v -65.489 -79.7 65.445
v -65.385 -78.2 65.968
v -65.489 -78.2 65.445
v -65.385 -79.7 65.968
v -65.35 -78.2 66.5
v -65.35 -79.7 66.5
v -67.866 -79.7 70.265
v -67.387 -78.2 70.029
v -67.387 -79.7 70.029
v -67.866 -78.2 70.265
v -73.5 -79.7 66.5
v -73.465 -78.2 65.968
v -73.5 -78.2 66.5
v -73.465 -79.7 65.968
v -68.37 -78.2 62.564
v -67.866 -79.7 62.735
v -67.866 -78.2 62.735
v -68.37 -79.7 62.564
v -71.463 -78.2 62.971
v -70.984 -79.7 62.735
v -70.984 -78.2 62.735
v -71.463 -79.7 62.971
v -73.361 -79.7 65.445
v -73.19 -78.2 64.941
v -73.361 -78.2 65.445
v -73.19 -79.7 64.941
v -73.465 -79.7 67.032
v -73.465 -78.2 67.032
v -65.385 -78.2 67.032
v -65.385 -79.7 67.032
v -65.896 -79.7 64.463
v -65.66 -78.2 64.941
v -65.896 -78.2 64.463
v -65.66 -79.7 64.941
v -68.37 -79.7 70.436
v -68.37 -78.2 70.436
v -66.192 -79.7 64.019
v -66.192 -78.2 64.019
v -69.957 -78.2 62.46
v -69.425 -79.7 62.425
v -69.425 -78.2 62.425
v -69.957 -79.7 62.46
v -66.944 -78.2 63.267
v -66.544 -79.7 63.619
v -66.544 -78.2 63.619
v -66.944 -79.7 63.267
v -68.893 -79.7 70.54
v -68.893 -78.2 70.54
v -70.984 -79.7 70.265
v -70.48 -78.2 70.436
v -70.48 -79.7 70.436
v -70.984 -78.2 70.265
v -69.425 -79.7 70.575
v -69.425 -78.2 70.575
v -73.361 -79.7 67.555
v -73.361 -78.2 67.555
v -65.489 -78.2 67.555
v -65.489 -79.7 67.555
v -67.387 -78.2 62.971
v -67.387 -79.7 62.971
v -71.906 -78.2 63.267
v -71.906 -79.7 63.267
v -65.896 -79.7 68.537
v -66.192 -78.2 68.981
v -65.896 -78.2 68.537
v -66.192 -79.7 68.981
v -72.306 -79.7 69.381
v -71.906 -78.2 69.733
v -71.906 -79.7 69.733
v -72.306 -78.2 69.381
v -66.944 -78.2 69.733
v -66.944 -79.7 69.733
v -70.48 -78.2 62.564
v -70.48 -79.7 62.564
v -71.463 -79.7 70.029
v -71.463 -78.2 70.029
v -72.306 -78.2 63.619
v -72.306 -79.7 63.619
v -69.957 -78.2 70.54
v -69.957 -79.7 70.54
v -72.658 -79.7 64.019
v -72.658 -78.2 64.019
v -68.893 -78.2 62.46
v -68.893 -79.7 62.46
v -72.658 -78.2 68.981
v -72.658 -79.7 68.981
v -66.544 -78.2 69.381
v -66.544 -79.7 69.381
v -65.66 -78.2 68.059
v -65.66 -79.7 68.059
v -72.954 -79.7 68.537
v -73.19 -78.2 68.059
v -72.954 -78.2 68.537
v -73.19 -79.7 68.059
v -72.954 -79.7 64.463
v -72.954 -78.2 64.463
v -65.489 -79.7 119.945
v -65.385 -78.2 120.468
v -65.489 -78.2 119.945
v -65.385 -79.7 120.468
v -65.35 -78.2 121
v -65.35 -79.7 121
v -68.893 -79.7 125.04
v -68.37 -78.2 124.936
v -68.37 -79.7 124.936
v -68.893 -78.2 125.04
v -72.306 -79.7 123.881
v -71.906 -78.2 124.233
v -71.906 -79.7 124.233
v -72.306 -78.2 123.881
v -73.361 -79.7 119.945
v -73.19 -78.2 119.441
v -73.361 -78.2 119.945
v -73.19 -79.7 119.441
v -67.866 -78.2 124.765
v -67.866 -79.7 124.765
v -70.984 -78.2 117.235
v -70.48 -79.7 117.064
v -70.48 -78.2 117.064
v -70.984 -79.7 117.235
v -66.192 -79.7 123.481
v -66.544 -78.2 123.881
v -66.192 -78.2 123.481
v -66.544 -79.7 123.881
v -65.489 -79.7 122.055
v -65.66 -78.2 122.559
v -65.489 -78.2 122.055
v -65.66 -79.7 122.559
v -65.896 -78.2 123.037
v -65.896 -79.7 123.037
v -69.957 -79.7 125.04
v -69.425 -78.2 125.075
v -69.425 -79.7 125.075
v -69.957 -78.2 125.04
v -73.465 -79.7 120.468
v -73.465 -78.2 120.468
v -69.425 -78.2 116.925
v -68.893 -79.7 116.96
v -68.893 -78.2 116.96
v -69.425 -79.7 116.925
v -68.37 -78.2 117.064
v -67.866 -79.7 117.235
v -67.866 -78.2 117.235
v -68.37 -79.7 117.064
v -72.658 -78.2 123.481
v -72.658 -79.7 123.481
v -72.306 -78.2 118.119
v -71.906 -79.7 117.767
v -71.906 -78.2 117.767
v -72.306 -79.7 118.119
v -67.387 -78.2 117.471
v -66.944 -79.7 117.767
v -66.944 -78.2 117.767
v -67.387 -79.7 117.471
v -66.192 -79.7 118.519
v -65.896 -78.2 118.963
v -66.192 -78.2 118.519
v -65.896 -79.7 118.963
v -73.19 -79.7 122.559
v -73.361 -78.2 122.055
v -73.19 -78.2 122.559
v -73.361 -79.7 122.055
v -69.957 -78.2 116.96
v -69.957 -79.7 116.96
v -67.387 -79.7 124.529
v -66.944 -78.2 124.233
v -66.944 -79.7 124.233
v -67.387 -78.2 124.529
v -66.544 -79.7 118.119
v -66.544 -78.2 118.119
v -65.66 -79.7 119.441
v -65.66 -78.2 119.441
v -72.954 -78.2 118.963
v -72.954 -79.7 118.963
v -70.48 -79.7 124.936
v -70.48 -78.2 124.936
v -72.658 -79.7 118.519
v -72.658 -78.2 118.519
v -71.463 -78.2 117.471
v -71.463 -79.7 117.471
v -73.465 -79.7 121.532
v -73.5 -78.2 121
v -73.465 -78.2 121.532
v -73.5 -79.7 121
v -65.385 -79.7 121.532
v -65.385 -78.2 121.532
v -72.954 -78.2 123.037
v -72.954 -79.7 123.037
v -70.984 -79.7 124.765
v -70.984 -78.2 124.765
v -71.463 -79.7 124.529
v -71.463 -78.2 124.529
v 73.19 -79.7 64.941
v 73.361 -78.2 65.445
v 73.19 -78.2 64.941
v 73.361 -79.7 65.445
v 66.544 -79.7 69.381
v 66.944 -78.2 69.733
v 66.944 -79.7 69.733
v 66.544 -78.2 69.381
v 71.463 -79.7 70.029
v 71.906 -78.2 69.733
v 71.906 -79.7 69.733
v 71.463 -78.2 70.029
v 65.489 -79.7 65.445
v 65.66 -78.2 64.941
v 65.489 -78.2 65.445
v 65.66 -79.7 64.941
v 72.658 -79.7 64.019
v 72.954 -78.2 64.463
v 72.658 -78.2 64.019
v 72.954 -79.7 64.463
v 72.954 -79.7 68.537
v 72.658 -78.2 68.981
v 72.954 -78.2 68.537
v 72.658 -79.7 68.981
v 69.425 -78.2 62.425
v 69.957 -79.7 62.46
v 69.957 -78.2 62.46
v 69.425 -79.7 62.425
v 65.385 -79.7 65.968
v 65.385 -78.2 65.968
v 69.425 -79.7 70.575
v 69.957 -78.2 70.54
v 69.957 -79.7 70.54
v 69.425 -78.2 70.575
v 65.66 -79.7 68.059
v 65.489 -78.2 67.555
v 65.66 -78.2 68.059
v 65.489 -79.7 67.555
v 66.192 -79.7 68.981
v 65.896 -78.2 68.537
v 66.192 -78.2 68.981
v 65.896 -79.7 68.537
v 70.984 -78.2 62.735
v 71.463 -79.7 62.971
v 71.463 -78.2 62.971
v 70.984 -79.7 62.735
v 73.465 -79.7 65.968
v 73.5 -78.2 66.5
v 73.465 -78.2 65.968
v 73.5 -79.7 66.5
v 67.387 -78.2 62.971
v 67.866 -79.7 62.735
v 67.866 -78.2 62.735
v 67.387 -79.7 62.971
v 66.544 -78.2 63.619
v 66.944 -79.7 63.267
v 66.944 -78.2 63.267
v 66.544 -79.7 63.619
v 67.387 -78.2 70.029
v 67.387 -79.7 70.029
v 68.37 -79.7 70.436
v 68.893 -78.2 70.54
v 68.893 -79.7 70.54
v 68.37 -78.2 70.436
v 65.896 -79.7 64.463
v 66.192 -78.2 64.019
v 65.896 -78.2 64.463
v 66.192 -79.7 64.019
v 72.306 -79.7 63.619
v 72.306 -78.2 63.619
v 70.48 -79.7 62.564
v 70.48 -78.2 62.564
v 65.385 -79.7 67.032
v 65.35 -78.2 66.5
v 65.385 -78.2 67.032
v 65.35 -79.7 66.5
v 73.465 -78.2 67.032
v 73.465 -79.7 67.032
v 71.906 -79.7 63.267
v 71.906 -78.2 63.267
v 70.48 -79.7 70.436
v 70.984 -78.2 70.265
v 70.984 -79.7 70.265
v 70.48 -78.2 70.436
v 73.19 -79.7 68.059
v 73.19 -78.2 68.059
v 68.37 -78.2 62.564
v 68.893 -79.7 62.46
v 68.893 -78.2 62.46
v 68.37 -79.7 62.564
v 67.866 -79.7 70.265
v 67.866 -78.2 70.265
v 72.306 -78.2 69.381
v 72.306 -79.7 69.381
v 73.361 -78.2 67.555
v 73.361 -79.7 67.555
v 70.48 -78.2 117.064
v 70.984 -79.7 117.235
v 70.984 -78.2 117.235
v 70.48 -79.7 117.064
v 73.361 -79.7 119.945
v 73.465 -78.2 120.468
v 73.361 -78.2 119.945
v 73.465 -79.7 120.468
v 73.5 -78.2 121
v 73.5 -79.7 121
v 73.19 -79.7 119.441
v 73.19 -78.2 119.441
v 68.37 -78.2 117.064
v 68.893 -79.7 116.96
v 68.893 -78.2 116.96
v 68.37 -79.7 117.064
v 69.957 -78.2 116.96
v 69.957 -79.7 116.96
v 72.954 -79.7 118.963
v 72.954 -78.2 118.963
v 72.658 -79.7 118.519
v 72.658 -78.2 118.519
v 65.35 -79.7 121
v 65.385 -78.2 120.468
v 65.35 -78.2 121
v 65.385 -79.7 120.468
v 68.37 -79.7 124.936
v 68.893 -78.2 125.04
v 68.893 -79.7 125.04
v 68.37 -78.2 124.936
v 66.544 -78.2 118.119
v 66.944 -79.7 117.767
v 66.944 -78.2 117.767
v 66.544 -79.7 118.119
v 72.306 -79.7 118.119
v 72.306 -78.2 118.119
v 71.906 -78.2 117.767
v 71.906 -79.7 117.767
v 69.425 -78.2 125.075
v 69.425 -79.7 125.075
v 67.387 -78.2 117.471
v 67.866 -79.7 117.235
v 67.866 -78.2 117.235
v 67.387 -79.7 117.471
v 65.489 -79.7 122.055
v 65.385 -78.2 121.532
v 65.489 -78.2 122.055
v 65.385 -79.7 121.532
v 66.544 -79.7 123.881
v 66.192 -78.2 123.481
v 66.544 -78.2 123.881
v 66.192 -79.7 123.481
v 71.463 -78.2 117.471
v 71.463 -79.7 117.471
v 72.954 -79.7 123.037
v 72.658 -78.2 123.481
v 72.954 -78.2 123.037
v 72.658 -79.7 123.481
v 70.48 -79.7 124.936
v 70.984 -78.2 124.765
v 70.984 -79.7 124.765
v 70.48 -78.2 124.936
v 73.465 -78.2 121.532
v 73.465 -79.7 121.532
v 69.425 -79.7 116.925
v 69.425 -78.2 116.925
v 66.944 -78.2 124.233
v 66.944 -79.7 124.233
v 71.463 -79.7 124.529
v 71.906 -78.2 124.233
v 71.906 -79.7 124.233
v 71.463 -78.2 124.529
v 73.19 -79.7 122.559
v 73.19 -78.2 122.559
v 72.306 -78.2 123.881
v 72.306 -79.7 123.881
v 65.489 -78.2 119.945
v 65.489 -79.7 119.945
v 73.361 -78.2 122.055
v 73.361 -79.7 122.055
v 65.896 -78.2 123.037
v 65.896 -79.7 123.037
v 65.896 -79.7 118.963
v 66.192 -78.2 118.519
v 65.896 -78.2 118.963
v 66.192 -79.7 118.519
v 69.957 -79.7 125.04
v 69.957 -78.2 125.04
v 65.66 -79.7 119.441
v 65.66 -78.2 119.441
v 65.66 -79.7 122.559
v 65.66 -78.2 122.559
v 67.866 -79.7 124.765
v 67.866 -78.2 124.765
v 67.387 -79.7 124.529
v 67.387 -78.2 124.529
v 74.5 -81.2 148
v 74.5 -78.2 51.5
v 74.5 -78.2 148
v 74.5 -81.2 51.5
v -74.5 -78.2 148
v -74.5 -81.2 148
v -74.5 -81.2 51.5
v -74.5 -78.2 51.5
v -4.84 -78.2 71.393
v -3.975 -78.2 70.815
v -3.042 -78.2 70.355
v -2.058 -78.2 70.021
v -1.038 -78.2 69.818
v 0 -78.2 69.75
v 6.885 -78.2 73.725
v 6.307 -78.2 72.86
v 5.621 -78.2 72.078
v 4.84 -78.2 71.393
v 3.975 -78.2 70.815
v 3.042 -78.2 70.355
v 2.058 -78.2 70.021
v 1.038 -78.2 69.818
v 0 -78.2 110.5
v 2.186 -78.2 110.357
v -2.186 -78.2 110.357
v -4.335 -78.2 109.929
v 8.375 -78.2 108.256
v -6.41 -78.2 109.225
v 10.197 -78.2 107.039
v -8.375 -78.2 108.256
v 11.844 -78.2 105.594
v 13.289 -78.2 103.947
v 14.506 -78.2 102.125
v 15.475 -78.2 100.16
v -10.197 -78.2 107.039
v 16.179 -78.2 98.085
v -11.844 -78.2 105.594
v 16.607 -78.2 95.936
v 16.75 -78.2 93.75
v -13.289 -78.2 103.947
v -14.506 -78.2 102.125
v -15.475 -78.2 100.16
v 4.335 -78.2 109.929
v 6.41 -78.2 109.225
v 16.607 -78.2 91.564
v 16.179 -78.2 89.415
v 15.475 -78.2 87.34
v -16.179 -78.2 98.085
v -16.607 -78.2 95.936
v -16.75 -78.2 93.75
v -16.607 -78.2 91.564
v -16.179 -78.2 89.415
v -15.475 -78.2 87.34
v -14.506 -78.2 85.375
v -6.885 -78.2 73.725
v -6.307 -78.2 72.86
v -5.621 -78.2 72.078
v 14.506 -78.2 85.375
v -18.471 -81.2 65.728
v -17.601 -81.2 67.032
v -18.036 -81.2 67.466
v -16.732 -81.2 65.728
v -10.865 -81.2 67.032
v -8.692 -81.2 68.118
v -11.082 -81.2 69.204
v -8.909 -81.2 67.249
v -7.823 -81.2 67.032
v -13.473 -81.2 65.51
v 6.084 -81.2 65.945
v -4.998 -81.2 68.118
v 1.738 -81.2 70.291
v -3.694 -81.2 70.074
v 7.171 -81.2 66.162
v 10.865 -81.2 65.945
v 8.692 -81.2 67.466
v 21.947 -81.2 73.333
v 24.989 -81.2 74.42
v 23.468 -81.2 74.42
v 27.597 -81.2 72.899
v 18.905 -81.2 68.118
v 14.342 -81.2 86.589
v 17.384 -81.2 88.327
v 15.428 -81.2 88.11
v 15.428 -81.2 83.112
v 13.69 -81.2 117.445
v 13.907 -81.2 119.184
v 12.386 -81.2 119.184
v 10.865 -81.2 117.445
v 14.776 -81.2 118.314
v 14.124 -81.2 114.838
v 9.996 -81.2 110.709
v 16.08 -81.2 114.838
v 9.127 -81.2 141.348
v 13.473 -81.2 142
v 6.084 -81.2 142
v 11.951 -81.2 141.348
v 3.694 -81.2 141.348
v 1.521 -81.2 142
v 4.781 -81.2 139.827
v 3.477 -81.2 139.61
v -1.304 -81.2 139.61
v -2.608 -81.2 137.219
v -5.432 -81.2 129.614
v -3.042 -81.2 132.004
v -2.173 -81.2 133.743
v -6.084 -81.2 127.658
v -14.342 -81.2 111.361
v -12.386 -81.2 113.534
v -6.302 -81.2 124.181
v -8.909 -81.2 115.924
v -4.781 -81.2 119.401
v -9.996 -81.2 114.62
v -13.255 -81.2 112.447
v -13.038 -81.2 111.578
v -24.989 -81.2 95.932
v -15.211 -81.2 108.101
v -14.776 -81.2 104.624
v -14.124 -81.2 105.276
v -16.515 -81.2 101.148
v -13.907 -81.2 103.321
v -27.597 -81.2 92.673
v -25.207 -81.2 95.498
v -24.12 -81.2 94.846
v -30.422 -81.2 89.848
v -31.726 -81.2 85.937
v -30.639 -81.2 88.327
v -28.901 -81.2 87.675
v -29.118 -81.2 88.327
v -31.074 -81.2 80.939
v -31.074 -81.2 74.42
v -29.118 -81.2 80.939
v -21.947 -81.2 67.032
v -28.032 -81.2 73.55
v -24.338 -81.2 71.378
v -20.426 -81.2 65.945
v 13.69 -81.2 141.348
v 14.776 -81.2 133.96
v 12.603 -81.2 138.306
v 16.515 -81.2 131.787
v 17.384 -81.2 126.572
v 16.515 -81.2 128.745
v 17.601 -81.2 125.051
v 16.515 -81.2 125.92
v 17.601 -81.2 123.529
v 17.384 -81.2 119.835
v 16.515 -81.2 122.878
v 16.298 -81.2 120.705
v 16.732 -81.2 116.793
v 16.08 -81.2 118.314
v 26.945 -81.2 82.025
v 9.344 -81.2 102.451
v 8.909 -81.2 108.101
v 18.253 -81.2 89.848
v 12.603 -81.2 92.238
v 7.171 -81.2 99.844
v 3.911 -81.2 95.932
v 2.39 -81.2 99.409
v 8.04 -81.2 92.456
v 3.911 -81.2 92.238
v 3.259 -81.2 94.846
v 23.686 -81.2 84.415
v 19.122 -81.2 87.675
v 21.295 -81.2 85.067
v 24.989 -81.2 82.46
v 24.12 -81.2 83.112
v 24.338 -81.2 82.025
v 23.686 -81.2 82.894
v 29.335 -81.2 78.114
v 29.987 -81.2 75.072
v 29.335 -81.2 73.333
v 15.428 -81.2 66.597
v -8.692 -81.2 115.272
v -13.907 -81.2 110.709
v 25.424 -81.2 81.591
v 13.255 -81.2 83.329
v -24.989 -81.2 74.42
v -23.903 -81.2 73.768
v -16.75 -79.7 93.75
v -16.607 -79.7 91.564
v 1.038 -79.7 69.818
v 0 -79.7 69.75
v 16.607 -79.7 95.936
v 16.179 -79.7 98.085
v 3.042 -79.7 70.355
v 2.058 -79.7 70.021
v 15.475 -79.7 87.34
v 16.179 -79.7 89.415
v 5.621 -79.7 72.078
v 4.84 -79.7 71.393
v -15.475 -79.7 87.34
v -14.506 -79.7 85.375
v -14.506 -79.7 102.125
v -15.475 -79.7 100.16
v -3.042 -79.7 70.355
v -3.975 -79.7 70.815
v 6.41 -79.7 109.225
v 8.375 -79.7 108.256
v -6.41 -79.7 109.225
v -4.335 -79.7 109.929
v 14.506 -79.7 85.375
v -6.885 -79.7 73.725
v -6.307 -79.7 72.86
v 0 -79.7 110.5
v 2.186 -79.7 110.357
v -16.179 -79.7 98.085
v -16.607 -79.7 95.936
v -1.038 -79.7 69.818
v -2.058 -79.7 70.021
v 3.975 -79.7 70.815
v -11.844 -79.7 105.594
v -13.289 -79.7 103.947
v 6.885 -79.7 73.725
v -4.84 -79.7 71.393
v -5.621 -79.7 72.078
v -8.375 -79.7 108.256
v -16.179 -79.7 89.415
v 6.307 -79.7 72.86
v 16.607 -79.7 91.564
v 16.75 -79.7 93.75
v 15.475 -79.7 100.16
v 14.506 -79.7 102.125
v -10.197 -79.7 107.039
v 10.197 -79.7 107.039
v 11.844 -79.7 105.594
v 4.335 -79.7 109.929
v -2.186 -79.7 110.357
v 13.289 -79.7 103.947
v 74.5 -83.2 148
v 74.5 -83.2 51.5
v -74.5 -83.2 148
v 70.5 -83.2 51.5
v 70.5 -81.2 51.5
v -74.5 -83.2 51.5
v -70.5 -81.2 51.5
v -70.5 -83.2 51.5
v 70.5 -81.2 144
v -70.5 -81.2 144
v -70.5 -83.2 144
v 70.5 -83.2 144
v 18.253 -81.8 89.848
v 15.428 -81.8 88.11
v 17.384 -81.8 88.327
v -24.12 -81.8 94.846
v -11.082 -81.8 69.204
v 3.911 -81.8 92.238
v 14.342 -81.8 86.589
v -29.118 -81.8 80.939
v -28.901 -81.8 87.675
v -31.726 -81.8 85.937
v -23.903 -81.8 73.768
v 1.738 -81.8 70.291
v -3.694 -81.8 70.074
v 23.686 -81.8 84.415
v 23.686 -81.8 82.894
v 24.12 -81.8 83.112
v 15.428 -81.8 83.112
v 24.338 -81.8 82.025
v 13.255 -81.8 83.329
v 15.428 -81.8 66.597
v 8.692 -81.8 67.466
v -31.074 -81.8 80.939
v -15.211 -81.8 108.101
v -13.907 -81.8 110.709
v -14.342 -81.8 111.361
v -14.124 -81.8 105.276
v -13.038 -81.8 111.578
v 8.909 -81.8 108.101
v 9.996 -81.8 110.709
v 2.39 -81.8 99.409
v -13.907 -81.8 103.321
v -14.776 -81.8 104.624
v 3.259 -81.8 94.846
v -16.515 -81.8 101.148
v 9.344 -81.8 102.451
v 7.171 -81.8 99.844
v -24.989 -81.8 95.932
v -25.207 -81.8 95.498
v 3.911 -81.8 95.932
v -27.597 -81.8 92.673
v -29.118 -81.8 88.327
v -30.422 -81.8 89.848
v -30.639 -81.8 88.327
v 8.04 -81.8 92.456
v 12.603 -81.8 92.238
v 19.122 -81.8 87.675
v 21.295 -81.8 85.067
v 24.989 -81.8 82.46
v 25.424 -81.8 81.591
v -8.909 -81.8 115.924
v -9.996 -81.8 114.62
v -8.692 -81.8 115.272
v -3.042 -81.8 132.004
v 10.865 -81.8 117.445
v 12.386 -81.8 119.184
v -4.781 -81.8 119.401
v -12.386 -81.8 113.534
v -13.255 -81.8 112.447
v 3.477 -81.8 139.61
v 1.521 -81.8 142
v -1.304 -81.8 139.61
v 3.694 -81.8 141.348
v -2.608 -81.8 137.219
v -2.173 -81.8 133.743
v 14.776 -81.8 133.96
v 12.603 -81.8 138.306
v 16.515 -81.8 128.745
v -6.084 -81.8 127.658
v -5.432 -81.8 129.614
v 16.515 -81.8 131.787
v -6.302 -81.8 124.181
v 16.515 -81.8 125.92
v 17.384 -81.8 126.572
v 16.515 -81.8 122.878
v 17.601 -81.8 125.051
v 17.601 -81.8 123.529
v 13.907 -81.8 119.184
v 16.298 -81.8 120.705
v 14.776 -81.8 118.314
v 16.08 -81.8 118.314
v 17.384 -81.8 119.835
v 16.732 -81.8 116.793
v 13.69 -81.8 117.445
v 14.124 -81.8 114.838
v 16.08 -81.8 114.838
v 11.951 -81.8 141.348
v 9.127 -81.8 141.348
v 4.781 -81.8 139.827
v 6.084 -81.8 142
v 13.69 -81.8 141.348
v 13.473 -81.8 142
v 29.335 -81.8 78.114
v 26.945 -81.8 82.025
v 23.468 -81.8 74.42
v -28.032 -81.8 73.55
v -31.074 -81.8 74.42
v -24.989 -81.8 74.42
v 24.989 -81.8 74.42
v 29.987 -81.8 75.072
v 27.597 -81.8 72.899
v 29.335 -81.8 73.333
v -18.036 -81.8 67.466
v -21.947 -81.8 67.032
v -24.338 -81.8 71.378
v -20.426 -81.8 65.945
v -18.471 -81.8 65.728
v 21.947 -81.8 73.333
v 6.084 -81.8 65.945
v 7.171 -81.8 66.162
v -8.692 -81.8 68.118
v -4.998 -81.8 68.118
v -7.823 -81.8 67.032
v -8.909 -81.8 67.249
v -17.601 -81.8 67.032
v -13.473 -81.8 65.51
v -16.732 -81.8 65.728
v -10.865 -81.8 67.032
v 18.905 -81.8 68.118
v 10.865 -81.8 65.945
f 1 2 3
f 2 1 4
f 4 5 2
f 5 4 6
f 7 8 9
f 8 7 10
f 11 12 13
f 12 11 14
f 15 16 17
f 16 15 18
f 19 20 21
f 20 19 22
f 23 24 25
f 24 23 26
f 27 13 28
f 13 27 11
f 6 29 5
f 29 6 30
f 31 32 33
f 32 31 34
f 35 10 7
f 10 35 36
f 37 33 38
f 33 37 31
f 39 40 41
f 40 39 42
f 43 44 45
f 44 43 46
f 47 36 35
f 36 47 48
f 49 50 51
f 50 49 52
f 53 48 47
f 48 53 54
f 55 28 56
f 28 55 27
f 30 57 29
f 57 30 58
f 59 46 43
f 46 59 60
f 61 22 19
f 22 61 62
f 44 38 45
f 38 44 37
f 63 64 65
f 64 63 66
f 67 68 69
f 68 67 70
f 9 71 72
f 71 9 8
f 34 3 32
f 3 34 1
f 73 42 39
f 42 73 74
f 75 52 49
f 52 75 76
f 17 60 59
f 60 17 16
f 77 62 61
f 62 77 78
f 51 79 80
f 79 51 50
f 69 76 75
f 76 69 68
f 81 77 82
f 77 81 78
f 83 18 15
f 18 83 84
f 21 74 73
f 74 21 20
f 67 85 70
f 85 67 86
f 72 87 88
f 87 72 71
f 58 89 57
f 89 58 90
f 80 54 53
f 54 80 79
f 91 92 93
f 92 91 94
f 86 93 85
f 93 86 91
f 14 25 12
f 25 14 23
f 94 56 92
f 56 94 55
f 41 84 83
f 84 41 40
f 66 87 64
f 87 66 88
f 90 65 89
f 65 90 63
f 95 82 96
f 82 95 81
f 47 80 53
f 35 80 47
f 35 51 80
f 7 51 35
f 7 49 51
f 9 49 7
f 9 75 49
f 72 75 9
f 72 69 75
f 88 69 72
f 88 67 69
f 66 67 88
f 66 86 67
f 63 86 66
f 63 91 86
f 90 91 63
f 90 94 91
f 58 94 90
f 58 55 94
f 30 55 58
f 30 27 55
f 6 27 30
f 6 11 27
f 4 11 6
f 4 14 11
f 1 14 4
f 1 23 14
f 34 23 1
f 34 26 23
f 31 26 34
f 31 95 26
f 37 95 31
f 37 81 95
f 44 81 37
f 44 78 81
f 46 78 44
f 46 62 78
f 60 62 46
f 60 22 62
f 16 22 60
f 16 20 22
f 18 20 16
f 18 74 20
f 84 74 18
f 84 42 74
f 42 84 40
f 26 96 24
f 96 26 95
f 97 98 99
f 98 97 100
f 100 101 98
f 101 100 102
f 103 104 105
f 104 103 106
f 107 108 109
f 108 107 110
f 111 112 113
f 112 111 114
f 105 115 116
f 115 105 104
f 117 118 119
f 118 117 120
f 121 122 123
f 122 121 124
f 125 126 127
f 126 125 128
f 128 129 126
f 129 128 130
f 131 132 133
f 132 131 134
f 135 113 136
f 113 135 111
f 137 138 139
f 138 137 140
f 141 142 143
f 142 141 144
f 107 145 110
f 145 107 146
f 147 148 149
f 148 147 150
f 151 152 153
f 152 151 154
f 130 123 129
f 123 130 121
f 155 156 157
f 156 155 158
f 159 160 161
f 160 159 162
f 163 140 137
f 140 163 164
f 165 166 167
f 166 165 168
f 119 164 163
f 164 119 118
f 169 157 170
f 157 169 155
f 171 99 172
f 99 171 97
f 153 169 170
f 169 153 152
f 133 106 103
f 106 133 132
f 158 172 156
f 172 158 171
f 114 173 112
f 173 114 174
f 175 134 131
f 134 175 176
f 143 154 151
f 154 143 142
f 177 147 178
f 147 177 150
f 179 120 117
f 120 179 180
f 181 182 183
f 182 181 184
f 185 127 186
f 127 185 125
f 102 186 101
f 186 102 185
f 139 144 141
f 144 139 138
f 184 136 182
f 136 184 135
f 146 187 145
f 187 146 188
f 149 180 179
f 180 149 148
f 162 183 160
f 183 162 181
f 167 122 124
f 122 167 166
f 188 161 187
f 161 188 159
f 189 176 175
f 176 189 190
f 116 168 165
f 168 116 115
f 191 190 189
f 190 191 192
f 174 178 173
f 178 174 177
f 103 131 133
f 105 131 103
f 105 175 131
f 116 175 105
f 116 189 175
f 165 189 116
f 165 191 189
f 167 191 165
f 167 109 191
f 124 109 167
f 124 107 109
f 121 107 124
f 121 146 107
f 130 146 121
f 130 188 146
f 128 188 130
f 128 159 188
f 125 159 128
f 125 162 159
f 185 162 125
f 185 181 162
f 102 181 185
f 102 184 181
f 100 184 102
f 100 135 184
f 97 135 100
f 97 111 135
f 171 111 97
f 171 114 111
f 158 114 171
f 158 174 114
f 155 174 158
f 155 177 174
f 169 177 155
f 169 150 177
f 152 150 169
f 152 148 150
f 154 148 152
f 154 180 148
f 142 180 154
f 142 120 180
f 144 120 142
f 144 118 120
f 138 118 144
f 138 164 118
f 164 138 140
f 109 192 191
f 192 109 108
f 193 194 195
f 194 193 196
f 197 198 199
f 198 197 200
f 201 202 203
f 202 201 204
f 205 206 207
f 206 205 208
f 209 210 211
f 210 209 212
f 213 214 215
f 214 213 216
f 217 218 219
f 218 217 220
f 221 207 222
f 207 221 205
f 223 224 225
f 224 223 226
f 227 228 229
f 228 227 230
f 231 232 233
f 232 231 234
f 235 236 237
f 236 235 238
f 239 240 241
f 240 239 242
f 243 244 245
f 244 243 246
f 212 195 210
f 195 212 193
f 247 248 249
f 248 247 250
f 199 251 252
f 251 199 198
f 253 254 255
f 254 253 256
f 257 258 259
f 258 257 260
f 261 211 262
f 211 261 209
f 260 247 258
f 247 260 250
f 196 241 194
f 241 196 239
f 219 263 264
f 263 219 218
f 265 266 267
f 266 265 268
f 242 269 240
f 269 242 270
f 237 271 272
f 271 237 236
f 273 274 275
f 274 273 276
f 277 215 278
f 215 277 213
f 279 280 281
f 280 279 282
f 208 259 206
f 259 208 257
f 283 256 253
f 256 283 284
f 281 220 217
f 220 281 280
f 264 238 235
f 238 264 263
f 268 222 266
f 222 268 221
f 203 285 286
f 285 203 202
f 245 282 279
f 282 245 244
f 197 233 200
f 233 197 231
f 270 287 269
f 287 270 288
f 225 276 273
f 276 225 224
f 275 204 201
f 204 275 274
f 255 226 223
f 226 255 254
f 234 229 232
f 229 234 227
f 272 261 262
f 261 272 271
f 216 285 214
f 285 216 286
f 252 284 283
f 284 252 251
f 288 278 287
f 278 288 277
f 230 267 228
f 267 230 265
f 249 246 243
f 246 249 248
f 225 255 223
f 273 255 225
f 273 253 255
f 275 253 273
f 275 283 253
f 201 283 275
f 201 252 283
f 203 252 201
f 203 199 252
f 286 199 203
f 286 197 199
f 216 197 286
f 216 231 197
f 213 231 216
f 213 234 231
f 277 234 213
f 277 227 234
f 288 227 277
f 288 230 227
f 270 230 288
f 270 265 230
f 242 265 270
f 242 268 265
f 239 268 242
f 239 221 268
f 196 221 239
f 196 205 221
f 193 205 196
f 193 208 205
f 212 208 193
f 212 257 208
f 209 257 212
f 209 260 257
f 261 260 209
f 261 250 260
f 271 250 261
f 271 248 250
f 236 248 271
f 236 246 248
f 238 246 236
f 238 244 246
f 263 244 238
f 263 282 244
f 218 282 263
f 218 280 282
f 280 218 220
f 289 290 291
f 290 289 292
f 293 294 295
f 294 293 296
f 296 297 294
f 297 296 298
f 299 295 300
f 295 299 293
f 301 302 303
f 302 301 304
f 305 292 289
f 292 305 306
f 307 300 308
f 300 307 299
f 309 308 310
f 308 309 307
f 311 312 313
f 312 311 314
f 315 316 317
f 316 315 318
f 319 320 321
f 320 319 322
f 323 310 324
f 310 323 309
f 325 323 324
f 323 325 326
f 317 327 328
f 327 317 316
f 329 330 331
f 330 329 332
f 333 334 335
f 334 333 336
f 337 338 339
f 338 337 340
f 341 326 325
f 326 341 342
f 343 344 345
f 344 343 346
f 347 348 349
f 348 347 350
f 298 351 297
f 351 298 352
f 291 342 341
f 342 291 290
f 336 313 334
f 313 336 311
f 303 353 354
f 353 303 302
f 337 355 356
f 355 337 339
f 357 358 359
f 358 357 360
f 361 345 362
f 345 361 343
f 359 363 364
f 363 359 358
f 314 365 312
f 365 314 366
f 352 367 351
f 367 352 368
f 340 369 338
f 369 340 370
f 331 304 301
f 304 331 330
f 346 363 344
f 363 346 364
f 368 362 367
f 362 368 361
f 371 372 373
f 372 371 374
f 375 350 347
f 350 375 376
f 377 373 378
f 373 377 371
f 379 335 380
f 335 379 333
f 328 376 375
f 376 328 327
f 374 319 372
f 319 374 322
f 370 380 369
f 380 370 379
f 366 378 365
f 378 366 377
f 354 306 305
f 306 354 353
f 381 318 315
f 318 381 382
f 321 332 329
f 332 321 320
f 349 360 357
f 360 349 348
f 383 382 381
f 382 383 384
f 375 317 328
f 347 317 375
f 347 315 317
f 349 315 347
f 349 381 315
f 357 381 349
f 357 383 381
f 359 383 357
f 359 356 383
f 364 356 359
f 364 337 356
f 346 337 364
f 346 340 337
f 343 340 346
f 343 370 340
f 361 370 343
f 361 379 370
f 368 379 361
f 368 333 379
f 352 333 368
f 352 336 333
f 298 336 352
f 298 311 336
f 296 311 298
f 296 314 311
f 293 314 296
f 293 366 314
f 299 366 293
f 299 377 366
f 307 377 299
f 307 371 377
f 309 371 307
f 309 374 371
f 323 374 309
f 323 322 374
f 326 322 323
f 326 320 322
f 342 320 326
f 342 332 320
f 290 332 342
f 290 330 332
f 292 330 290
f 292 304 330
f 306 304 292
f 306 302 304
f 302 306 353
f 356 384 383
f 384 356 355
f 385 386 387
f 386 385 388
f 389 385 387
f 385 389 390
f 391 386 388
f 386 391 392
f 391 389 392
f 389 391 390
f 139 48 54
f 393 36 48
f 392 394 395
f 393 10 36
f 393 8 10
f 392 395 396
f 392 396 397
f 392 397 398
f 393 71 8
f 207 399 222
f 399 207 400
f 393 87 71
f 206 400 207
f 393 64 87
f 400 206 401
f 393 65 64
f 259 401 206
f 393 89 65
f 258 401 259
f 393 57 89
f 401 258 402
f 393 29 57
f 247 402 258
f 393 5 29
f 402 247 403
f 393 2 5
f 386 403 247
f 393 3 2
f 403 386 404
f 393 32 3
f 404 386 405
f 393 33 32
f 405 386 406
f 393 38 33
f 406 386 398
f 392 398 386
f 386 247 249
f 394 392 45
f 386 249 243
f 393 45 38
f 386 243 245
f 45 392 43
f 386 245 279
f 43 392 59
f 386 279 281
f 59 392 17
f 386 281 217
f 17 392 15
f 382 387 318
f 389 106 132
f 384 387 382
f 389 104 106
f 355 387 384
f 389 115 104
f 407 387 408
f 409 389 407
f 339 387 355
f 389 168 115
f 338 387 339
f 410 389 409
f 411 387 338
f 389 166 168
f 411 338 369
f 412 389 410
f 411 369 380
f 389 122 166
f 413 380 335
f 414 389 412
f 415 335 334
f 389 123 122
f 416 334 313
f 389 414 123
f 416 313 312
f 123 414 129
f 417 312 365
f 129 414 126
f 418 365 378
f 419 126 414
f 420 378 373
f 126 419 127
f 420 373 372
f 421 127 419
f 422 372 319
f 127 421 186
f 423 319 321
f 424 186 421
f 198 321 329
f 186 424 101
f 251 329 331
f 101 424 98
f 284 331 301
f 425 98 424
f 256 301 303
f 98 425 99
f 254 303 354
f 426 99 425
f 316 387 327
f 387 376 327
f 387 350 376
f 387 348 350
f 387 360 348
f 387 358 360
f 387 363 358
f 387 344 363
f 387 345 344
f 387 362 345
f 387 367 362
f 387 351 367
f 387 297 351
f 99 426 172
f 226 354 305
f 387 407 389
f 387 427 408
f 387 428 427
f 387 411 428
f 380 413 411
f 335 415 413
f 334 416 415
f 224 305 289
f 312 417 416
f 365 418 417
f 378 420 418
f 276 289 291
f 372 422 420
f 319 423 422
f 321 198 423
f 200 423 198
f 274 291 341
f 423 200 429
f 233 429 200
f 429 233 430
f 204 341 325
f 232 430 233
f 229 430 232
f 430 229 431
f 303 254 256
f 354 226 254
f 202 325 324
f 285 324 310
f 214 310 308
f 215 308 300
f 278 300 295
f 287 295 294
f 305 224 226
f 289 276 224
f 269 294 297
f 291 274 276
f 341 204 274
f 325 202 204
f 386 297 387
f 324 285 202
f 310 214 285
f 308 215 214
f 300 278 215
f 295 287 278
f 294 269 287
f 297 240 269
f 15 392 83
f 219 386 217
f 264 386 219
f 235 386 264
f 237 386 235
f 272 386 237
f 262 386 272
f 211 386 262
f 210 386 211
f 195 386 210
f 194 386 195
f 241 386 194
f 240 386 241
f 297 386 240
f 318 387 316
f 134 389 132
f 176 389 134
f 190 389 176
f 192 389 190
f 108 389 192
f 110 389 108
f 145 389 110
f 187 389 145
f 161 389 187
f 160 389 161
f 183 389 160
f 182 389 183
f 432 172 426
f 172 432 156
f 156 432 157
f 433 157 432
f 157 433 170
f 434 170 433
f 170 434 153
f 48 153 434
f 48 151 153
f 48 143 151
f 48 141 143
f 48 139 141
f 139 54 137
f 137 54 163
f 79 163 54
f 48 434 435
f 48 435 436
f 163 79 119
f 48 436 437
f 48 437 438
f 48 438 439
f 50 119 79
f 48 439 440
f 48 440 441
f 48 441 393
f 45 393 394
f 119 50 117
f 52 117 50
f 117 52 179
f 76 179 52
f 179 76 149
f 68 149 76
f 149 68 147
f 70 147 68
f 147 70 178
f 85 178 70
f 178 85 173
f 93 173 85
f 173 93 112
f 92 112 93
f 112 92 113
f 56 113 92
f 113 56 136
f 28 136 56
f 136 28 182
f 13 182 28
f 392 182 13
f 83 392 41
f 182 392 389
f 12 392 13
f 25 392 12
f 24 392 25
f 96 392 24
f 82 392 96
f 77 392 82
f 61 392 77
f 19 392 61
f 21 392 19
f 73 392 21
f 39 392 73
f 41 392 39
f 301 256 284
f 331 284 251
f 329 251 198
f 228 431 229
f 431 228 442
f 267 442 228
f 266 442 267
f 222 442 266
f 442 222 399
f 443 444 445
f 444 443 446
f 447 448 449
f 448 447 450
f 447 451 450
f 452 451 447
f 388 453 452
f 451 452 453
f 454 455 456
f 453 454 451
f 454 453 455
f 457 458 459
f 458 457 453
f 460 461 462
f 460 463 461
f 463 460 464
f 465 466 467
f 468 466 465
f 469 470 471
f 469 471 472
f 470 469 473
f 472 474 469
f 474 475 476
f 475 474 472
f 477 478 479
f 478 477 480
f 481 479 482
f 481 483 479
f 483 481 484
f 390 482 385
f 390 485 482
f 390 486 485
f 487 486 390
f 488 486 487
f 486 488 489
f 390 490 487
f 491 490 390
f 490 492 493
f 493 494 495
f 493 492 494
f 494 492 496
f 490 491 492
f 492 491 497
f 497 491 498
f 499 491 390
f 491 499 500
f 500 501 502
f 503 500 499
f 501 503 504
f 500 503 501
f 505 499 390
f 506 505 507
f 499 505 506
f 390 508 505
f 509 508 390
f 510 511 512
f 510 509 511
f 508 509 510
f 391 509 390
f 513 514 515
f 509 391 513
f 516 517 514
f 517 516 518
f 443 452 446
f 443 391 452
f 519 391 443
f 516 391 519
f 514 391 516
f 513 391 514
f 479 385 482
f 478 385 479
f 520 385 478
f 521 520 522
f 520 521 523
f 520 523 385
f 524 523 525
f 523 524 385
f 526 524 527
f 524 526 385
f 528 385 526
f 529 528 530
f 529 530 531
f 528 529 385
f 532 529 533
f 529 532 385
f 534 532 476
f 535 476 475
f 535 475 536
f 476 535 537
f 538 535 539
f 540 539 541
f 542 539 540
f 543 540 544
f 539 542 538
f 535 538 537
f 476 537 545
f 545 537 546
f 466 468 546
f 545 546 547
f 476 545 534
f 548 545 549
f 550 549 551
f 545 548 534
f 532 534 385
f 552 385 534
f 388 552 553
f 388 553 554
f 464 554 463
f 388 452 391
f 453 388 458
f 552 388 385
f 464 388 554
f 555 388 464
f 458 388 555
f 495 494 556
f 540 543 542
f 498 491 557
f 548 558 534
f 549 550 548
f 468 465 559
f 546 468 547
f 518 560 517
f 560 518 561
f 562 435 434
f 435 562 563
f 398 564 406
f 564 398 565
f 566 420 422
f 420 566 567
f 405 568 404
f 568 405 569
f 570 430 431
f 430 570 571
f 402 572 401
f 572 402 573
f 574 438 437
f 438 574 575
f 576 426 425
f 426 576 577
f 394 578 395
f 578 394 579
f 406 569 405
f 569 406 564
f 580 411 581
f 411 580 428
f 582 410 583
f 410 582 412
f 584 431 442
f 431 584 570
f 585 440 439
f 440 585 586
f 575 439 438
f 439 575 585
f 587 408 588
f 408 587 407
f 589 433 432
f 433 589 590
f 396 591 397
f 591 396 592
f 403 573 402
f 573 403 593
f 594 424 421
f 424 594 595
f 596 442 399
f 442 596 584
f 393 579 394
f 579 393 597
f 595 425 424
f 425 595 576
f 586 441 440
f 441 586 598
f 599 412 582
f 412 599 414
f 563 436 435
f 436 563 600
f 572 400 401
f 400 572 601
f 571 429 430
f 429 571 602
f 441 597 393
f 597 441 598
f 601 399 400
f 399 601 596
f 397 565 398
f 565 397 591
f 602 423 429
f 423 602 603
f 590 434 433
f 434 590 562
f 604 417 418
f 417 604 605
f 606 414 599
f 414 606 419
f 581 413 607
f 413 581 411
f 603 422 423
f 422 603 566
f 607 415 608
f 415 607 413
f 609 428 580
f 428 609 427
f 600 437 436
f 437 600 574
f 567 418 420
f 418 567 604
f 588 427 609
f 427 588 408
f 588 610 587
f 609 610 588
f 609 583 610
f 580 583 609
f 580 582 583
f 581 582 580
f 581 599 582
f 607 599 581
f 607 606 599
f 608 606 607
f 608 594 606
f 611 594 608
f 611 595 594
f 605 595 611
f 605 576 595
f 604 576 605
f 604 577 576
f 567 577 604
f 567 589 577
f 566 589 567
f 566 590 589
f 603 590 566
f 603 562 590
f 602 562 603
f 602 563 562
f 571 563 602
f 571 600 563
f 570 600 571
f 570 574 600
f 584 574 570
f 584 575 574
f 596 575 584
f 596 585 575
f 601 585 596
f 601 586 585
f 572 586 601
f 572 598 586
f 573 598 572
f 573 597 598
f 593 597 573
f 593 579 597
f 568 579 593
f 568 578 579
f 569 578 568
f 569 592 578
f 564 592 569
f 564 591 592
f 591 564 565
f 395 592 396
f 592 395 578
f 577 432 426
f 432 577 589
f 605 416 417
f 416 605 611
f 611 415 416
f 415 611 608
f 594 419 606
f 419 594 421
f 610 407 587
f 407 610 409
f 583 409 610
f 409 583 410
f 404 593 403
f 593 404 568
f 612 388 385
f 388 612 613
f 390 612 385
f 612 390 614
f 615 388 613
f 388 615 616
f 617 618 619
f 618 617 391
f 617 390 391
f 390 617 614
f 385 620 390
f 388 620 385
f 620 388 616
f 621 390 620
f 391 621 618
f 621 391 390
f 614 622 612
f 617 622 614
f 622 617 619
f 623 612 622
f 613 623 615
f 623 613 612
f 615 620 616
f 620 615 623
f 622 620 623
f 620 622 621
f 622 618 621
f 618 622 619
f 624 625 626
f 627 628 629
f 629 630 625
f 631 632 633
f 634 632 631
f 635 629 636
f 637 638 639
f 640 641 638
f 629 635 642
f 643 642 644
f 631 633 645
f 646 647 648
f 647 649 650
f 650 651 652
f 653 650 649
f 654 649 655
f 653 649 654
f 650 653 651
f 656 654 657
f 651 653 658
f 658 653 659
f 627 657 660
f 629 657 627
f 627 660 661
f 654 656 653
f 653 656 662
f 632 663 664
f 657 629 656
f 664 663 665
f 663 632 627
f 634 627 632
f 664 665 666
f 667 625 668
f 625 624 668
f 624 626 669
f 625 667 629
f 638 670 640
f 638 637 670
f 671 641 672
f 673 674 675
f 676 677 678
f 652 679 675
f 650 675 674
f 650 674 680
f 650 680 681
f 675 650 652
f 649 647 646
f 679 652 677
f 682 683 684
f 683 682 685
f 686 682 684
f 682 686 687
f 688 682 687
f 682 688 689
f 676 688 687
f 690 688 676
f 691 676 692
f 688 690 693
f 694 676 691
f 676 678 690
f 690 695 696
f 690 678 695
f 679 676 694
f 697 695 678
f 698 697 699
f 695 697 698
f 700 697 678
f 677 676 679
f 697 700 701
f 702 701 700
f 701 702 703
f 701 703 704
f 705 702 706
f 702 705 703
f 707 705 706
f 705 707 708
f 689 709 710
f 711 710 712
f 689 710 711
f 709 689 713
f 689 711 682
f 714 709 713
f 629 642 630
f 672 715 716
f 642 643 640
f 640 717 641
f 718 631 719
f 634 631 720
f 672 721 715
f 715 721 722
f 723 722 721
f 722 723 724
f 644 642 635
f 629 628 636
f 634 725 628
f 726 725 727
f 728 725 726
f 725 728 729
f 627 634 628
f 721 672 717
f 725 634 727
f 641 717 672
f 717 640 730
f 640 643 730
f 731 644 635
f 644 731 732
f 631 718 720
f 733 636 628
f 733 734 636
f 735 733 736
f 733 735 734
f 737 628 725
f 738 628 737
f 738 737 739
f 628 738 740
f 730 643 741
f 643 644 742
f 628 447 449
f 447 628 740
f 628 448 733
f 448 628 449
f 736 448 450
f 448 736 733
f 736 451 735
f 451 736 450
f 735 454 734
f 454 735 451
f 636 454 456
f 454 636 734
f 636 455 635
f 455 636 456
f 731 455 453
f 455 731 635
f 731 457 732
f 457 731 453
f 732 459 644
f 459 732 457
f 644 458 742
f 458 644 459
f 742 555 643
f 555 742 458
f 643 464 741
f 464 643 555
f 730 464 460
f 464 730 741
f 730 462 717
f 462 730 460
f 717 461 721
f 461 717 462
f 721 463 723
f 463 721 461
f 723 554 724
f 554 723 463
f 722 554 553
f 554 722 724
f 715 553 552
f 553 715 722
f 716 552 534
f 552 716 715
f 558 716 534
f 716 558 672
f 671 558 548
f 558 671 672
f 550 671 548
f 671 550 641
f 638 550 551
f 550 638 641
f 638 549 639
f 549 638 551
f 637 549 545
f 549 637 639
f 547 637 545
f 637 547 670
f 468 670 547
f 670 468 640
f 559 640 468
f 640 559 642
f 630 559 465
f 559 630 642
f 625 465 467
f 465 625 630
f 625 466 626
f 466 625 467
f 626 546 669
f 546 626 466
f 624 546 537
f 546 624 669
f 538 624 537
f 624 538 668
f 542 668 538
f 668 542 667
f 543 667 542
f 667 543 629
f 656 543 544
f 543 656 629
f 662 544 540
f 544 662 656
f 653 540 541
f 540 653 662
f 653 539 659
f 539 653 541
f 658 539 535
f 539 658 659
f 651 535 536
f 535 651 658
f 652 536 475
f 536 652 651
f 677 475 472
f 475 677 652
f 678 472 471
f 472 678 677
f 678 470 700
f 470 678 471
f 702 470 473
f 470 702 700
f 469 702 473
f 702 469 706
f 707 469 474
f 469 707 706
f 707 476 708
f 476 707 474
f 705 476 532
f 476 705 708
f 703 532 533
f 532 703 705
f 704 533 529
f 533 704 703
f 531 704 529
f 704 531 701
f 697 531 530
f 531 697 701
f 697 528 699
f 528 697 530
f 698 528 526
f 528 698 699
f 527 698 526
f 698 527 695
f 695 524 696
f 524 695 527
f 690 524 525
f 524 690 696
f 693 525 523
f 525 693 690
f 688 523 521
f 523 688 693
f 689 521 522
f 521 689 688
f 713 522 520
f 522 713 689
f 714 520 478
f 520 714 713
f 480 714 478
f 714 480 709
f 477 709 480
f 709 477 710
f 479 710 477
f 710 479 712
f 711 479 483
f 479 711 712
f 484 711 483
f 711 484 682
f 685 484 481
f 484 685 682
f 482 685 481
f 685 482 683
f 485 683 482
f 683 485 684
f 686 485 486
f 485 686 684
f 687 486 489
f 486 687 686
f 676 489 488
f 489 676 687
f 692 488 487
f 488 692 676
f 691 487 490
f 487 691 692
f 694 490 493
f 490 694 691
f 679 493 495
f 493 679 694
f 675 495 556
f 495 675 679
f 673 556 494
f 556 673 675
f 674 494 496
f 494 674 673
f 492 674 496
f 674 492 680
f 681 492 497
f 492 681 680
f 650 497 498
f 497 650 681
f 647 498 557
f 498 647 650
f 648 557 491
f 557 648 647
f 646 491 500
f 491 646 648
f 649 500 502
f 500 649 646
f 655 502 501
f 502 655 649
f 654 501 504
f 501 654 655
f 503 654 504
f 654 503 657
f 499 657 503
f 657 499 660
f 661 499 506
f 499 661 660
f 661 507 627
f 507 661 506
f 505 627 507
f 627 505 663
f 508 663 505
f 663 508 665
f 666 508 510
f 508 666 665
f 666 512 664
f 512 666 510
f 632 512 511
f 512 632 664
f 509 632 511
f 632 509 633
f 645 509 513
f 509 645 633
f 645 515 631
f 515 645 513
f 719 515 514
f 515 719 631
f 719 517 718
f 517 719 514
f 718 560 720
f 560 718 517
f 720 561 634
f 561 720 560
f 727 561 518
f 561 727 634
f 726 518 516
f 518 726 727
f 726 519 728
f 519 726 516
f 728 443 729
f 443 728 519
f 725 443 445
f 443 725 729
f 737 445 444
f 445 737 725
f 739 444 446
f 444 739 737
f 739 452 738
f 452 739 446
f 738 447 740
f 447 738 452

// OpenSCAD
//
// ============================================================================
// SteamMachine UM790
// Project Phoenix
//
// Archivo  : nfc_panel_teknoparrot.scad
// Versión  : 0.1 (BORRADOR — pendiente del icono del loro)
// Fecha    : 2026-08-03
// Autor    : Pep Ventura (asistido por Claude)
//
// Panel NFC — TEMA TEKNOPARROT. Reutiliza la base compartida de
// nfc_panel.scad (nfcPanelBase()), igual que nfc_panel_retrobat.scad.
//
// ESTADO: el texto "TEKNOPARROT" ya está listo y verificado. El
// icono del loro está PENDIENTE — no he podido acceder a una imagen
// del logo con el detalle de píxel necesario para medirlo con
// precisión (como sí se hizo con Steam y RetroBat, ambos aportados
// directamente por el usuario). En cuanto se suba una imagen de
// referencia, se mide igual que los otros dos temas y se rellena
// teknoparrotLogo2D()/teknoparrotLogoEmboss() más abajo.
//
// Colores oficiales de la marca (de teknoparrot.com, por si ayudan a
// elegir el filamento): azul "Chambray" #2F5B89, crema "White Linen"
// #F8F3E8, azul marino "Blue Zodiac" #0A1E32.
//
// ============================================================================

include <../../../00_parametros.scad>;
include <../../reference/components/assembly_positions.scad>;

use <nfc_panel.scad>;

$fn = 64;

//=============================================================================
// LOGO TEKNOPARROT — PENDIENTE
//
// Placeholder vacío hasta tener la imagen de referencia. Mismo
// criterio de espacio que Steam/RetroBat: icono arriba (hasta 64mm
// de alto disponibles), texto "TEKNOPARROT" debajo.
//=============================================================================

//=============================================================================
// LOGO TEKNOPARROT (loro pirata + texto integrado en el diseño)
//
// PEDIDO POR EL USUARIO (2026-08-03): "Podrías modificar el panel de
// teknoparrot con el anagrama del fichero adjunto" — el usuario
// aportó un SVG limpio (teknoparrot-logo.svg, creado con Inkscape,
// con un diseño a color de líneas limpias — no una foto de una pieza
// física como la primera versión). Aunque el SVG en sí envolvía una
// imagen PNG incrustada (no rutas vectoriales puras), la imagen es
// mucho más limpia que la foto anterior — se ha vuelto a medir por
// análisis de contorno (máscara por canal alfa + simplificación de
// polígono), sustituyendo la silueta anterior por completo.
//
// El texto "TEKNO PARROT" sigue viniendo integrado en el propio
// diseño (no hace falta texto aparte). Sigue siendo UN ÚNICO
// contorno cerrado (mismo criterio que la versión anterior, para el
// "llenar" del laminador).
//
// PEDIDO POR EL USUARIO: "ajustar el tamaño para que ocupe gran
// parte del panel" — escala calculada para ocupar la altura útil
// completa del panel.
//=============================================================================

teknoparrot_logo_scale = 0.2173;  // ajustado para ocupar la altura útil completa del panel (80,5mm menos margen de seguridad)
teknoparrot_logo_depth = 0.6;
teknoparrot_logo_natural_w = 292;
teknoparrot_logo_natural_h = 352;
teknoparrot_logo_natural_cx = 153.0;
teknoparrot_logo_natural_cy = 184.0;

module teknoparrotLogo2D(s=1)
{
    scale(s)
        translate([-teknoparrot_logo_natural_cx, -teknoparrot_logo_natural_cy])
            polygon(points=[
                [195,357],[181,360],[175,350],[169,349],[170,357],[160,360],
                [147,349],[141,338],[143,322],[139,314],[128,303],[125,294],
                [124,278],[131,256],[113,237],[112,240],[107,234],[96,229],
                [92,224],[93,220],[89,216],[87,219],[83,204],[88,191],[85,188],
                [89,182],[77,172],[38,148],[37,146],[42,143],[26,133],[13,120],
                [12,113],[19,113],[20,110],[7,102],[10,79],[19,79],[10,49],
                [24,45],[38,49],[43,46],[41,35],[52,15],[59,10],[68,9],[70,17],
                [72,15],[76,9],[91,8],[103,15],[102,25],[113,20],[112,16],
                [117,15],[130,20],[136,29],[161,30],[176,15],[181,10],[186,11],
                [193,17],[203,10],[224,13],[240,20],[247,32],[254,44],[261,49],
                [268,49],[280,42],[288,44],[291,52],[288,66],[277,84],[270,82],
                [268,86],[265,84],[262,88],[264,89],[262,95],[251,98],[224,89],
                [214,90],[219,105],[224,112],[233,113],[241,110],[237,120],
                [211,131],[190,132],[171,131],[168,143],[171,148],[164,164],
                [186,166],[196,178],[194,204],[199,216],[203,247],[210,255],
                [217,255],[221,251],[216,247],[218,235],[227,235],[230,244],
                [227,251],[233,258],[228,262],[229,272],[234,275],[234,282],
                [229,286],[233,289],[229,299],[229,313],[221,323],[211,343],
                [216,357],[215,360],[208,357]
            ]);
}
module teknoparrotLogoEmboss()
{

    logoH = teknoparrot_logo_natural_h * teknoparrot_logo_scale;
    logoTopZ = nfc_panel_z_high - front_bezel_border - 2;

    translate([
        0,
        -case_depth/2,
        logoTopZ - logoH/2
    ])

        rotate([90,0,0])

            linear_extrude(teknoparrot_logo_depth)

                teknoparrotLogo2D(teknoparrot_logo_scale);

}


//=============================================================================
// TEXTO SEPARADO — NO HACE FALTA
//
// A diferencia de Steam/RetroBat, aquí "TEKNO PARROT" ya viene
// integrado en el propio contorno del logo (ver nota en
// teknoparrotLogo2D() más arriba) — no se añade un texto aparte para
// no duplicarlo.
//=============================================================================


//=============================================================================
// PANEL COMPLETO (tema TeknoParrot)
//=============================================================================

module nfcPanelTeknoParrot()
{

    union()
    {

        nfcPanelBase();

        teknoparrotLogoEmboss();

    }

}


//=============================================================================
// PREVIEW (base + emblema en color distinto, para ver el resultado
// con más contraste — el acabado real depende del filamento elegido
// en el laminador)
//=============================================================================

color([0.15,0.15,0.15,1])
    nfcPanelBase();

color([1,0.6,0.1,1])
    teknoparrotLogoEmboss();
